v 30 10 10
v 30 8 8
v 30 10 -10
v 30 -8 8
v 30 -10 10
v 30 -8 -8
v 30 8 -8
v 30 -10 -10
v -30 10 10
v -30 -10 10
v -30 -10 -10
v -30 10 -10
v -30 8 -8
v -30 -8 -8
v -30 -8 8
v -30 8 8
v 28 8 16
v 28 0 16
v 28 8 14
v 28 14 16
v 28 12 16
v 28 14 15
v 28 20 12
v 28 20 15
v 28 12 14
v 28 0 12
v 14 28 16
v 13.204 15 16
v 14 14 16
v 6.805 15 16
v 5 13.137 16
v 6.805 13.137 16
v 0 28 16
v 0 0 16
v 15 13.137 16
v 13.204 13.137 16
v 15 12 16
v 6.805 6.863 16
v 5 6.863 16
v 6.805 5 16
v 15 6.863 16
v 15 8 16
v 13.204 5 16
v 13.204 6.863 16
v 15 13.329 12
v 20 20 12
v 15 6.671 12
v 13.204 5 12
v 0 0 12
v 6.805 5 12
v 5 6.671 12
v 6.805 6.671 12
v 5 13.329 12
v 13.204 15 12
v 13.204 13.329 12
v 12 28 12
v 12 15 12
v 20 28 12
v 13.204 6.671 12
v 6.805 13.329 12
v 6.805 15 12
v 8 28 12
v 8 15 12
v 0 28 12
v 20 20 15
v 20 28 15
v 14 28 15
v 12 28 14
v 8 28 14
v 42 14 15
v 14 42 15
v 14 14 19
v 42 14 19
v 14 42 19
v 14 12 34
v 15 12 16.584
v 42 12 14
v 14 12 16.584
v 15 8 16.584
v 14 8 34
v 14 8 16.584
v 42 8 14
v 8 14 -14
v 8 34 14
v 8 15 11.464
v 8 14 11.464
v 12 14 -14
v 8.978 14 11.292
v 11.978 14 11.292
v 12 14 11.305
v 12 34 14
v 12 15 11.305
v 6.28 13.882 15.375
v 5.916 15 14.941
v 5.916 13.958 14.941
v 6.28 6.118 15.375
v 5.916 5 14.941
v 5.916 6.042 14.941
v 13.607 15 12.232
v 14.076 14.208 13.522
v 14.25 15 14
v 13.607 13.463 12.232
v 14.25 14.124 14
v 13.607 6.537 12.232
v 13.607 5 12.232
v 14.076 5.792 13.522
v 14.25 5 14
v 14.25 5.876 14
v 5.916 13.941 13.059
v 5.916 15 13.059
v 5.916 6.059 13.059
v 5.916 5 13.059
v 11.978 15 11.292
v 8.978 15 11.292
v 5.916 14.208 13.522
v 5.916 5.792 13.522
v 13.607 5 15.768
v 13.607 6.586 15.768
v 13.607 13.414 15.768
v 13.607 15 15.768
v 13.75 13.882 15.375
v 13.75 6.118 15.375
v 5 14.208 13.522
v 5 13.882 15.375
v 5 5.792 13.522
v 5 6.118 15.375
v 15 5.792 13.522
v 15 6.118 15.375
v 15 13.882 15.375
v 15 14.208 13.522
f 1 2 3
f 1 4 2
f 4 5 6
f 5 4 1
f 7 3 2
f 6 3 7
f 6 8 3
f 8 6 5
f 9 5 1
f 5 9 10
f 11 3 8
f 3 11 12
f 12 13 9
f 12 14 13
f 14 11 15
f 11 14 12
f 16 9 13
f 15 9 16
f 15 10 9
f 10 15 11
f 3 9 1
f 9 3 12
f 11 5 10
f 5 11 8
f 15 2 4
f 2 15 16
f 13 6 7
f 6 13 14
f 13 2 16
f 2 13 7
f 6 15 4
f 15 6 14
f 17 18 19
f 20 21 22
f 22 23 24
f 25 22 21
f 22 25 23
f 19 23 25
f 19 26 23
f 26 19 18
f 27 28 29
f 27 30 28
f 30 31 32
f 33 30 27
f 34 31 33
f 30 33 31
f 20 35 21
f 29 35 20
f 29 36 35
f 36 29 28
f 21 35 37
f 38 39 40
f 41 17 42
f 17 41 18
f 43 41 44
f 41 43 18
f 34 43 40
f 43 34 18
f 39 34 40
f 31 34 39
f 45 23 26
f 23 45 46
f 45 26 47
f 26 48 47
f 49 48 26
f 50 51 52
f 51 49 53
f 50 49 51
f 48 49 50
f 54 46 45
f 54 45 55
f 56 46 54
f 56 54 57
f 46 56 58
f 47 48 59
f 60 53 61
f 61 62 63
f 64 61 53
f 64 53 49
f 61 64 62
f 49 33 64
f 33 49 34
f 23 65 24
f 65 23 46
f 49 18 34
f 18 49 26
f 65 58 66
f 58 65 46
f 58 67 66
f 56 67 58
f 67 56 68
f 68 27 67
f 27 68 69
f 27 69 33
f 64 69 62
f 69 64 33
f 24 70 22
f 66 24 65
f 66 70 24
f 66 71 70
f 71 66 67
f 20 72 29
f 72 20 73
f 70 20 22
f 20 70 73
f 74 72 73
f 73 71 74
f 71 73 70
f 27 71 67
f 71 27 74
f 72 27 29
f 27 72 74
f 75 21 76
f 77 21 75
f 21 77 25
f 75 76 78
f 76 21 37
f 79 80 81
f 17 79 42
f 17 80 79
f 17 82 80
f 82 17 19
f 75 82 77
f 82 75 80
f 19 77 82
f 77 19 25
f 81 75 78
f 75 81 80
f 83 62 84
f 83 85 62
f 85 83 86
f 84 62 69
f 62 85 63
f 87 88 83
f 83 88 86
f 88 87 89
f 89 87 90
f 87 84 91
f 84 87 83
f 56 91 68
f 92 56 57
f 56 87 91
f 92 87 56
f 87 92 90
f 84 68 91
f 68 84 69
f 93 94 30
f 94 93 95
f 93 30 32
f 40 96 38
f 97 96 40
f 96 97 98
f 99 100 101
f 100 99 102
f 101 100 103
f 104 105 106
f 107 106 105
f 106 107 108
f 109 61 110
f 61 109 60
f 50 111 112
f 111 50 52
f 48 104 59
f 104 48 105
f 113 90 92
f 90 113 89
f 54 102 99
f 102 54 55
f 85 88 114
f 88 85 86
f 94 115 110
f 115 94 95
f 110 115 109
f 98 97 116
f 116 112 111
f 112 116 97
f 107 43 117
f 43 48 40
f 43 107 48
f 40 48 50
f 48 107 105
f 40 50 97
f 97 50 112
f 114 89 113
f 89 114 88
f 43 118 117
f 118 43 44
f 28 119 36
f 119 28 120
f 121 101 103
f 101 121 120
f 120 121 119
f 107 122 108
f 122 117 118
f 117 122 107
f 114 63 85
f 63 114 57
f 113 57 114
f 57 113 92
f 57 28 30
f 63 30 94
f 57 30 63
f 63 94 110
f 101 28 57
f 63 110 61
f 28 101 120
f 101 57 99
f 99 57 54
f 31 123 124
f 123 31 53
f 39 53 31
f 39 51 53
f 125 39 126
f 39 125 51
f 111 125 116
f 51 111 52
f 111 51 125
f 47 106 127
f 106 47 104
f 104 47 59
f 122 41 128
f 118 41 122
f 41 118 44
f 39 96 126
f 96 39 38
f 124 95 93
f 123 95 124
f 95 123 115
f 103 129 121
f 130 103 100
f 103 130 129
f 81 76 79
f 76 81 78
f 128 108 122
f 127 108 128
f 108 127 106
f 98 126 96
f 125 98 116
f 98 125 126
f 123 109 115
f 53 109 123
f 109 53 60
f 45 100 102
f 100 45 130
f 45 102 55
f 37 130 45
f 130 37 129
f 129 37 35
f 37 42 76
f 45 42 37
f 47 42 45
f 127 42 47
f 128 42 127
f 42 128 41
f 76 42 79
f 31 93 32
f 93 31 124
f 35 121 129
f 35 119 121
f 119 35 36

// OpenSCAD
// Parameters
bracket_size_x = 28; //[14:56:1]
bracket_size_y = 28; //[14:56:1]
extrusion_interface_size = 20; //[10:40:1]
bracket_depth_z = 20; //[10:40:1]
base_thickness = 4; //[2:8:1]
gusset_thickness = 4; //[2:8:1]
hole_diameter = 5.5; //[3:8:0.1]
hole_offset_from_corner = 10; //[6:18:0.5]
hole_slot_span = 3; //[1:6:0.5]
hole_depth_extra = 2; //[1:6:0.5]
overlap = 1; //[0.5:2:0.1]
extrusion_length = 60; //[30:120:1]
extrusion_wall = 2; //[1:4:0.5]

// Extrusion - complete geometry
module extrusion() {
  color([0.85, 0.85, 0.8]) {
    difference() {
      // Outer extrusion
      cube([extrusion_length, extrusion_interface_size, extrusion_interface_size], center=true);
      // Inner cutout
      translate([0, 0, 0])
        cube([extrusion_length + 2*overlap, extrusion_interface_size - 2*extrusion_wall, extrusion_interface_size - 2*extrusion_wall], center=true);
    }
  }
}

// Extrusion Corner Bracket Hole Positions - complete geometry
module extrusion_corner_bracket_hole_positions() {
  color("Silver") {
    union() {
      // X-axis hole slot
      hull() {
        translate([hole_offset_from_corner + hole_slot_span/2, bracket_depth_z/2, base_thickness/2])
          rotate([90, 0, 0])
          cylinder(r=hole_diameter/2, h=base_thickness + gusset_thickness + hole_depth_extra, center=true);
        translate([hole_offset_from_corner - hole_slot_span/2, bracket_depth_z/2, base_thickness/2])
          rotate([90, 0, 0])
          cylinder(r=hole_diameter/2, h=base_thickness + gusset_thickness + hole_depth_extra, center=true);
      }
      // Y-axis hole slot
      hull() {
        translate([bracket_depth_z/2, hole_offset_from_corner + hole_slot_span/2, base_thickness/2])
          rotate([0, 90, 0])
          cylinder(r=hole_diameter/2, h=base_thickness + gusset_thickness + hole_depth_extra, center=true);
        translate([bracket_depth_z/2, hole_offset_from_corner - hole_slot_span/2, base_thickness/2])
          rotate([0, 90, 0])
          cylinder(r=hole_diameter/2, h=base_thickness + gusset_thickness + hole_depth_extra, center=true);
      }
    }
  }
}

// Extrusion Corner Bracket - complete geometry
module extrusion_corner_bracket() {
  color("Silver") {
    union() {
      // Base plates
      union() {
        translate([bracket_size_x/2, bracket_depth_z/2, base_thickness/2])
          cube([bracket_size_x, bracket_depth_z, base_thickness], center=true);
        translate([bracket_depth_z/2, bracket_size_y/2, base_thickness/2])
          cube([bracket_depth_z, bracket_size_y, base_thickness], center=true);
      }
      // Gussets
      union() {
        translate([bracket_size_x/2, bracket_size_y/2, base_thickness + gusset_thickness/2 - overlap])
          linear_extrude(height=gusset_thickness, center=true)
          polygon(points=[[0, 0], [bracket_size_x, 0], [0, bracket_size_y]]);
        translate([bracket_size_x/2, bracket_depth_z/2, base_thickness/2])
          rotate([90, 0, 0])
          linear_extrude(height=gusset_thickness, center=true)
          polygon(points=[[0, 0], [bracket_size_x, 0], [0, bracket_depth_z]]);
        translate([bracket_depth_z/2, bracket_size_y/2, base_thickness/2])
          rotate([0, 90, 0])
          linear_extrude(height=gusset_thickness, center=true)
          polygon(points=[[0, 0], [bracket_size_y, 0], [0, bracket_depth_z]]);
      }
    }
  }
}

// Extrusion Corner Bracket 3D - complete geometry
module extrusion_corner_bracket_3D() {
  difference() {
    extrusion_corner_bracket();
    extrusion_corner_bracket_hole_positions();
  }
}

// Extrusion Corner Bracket Assembly - complete geometry
module extrusion_corner_bracket_assembly() {
  union() {
    extrusion();
    translate([0, 0, extrusion_interface_size/2 + base_thickness/2])
      extrusion_corner_bracket_3D();
  }
}

// Assembly
module assembly() {
  extrusion_corner_bracket_assembly();
}

assembly();
